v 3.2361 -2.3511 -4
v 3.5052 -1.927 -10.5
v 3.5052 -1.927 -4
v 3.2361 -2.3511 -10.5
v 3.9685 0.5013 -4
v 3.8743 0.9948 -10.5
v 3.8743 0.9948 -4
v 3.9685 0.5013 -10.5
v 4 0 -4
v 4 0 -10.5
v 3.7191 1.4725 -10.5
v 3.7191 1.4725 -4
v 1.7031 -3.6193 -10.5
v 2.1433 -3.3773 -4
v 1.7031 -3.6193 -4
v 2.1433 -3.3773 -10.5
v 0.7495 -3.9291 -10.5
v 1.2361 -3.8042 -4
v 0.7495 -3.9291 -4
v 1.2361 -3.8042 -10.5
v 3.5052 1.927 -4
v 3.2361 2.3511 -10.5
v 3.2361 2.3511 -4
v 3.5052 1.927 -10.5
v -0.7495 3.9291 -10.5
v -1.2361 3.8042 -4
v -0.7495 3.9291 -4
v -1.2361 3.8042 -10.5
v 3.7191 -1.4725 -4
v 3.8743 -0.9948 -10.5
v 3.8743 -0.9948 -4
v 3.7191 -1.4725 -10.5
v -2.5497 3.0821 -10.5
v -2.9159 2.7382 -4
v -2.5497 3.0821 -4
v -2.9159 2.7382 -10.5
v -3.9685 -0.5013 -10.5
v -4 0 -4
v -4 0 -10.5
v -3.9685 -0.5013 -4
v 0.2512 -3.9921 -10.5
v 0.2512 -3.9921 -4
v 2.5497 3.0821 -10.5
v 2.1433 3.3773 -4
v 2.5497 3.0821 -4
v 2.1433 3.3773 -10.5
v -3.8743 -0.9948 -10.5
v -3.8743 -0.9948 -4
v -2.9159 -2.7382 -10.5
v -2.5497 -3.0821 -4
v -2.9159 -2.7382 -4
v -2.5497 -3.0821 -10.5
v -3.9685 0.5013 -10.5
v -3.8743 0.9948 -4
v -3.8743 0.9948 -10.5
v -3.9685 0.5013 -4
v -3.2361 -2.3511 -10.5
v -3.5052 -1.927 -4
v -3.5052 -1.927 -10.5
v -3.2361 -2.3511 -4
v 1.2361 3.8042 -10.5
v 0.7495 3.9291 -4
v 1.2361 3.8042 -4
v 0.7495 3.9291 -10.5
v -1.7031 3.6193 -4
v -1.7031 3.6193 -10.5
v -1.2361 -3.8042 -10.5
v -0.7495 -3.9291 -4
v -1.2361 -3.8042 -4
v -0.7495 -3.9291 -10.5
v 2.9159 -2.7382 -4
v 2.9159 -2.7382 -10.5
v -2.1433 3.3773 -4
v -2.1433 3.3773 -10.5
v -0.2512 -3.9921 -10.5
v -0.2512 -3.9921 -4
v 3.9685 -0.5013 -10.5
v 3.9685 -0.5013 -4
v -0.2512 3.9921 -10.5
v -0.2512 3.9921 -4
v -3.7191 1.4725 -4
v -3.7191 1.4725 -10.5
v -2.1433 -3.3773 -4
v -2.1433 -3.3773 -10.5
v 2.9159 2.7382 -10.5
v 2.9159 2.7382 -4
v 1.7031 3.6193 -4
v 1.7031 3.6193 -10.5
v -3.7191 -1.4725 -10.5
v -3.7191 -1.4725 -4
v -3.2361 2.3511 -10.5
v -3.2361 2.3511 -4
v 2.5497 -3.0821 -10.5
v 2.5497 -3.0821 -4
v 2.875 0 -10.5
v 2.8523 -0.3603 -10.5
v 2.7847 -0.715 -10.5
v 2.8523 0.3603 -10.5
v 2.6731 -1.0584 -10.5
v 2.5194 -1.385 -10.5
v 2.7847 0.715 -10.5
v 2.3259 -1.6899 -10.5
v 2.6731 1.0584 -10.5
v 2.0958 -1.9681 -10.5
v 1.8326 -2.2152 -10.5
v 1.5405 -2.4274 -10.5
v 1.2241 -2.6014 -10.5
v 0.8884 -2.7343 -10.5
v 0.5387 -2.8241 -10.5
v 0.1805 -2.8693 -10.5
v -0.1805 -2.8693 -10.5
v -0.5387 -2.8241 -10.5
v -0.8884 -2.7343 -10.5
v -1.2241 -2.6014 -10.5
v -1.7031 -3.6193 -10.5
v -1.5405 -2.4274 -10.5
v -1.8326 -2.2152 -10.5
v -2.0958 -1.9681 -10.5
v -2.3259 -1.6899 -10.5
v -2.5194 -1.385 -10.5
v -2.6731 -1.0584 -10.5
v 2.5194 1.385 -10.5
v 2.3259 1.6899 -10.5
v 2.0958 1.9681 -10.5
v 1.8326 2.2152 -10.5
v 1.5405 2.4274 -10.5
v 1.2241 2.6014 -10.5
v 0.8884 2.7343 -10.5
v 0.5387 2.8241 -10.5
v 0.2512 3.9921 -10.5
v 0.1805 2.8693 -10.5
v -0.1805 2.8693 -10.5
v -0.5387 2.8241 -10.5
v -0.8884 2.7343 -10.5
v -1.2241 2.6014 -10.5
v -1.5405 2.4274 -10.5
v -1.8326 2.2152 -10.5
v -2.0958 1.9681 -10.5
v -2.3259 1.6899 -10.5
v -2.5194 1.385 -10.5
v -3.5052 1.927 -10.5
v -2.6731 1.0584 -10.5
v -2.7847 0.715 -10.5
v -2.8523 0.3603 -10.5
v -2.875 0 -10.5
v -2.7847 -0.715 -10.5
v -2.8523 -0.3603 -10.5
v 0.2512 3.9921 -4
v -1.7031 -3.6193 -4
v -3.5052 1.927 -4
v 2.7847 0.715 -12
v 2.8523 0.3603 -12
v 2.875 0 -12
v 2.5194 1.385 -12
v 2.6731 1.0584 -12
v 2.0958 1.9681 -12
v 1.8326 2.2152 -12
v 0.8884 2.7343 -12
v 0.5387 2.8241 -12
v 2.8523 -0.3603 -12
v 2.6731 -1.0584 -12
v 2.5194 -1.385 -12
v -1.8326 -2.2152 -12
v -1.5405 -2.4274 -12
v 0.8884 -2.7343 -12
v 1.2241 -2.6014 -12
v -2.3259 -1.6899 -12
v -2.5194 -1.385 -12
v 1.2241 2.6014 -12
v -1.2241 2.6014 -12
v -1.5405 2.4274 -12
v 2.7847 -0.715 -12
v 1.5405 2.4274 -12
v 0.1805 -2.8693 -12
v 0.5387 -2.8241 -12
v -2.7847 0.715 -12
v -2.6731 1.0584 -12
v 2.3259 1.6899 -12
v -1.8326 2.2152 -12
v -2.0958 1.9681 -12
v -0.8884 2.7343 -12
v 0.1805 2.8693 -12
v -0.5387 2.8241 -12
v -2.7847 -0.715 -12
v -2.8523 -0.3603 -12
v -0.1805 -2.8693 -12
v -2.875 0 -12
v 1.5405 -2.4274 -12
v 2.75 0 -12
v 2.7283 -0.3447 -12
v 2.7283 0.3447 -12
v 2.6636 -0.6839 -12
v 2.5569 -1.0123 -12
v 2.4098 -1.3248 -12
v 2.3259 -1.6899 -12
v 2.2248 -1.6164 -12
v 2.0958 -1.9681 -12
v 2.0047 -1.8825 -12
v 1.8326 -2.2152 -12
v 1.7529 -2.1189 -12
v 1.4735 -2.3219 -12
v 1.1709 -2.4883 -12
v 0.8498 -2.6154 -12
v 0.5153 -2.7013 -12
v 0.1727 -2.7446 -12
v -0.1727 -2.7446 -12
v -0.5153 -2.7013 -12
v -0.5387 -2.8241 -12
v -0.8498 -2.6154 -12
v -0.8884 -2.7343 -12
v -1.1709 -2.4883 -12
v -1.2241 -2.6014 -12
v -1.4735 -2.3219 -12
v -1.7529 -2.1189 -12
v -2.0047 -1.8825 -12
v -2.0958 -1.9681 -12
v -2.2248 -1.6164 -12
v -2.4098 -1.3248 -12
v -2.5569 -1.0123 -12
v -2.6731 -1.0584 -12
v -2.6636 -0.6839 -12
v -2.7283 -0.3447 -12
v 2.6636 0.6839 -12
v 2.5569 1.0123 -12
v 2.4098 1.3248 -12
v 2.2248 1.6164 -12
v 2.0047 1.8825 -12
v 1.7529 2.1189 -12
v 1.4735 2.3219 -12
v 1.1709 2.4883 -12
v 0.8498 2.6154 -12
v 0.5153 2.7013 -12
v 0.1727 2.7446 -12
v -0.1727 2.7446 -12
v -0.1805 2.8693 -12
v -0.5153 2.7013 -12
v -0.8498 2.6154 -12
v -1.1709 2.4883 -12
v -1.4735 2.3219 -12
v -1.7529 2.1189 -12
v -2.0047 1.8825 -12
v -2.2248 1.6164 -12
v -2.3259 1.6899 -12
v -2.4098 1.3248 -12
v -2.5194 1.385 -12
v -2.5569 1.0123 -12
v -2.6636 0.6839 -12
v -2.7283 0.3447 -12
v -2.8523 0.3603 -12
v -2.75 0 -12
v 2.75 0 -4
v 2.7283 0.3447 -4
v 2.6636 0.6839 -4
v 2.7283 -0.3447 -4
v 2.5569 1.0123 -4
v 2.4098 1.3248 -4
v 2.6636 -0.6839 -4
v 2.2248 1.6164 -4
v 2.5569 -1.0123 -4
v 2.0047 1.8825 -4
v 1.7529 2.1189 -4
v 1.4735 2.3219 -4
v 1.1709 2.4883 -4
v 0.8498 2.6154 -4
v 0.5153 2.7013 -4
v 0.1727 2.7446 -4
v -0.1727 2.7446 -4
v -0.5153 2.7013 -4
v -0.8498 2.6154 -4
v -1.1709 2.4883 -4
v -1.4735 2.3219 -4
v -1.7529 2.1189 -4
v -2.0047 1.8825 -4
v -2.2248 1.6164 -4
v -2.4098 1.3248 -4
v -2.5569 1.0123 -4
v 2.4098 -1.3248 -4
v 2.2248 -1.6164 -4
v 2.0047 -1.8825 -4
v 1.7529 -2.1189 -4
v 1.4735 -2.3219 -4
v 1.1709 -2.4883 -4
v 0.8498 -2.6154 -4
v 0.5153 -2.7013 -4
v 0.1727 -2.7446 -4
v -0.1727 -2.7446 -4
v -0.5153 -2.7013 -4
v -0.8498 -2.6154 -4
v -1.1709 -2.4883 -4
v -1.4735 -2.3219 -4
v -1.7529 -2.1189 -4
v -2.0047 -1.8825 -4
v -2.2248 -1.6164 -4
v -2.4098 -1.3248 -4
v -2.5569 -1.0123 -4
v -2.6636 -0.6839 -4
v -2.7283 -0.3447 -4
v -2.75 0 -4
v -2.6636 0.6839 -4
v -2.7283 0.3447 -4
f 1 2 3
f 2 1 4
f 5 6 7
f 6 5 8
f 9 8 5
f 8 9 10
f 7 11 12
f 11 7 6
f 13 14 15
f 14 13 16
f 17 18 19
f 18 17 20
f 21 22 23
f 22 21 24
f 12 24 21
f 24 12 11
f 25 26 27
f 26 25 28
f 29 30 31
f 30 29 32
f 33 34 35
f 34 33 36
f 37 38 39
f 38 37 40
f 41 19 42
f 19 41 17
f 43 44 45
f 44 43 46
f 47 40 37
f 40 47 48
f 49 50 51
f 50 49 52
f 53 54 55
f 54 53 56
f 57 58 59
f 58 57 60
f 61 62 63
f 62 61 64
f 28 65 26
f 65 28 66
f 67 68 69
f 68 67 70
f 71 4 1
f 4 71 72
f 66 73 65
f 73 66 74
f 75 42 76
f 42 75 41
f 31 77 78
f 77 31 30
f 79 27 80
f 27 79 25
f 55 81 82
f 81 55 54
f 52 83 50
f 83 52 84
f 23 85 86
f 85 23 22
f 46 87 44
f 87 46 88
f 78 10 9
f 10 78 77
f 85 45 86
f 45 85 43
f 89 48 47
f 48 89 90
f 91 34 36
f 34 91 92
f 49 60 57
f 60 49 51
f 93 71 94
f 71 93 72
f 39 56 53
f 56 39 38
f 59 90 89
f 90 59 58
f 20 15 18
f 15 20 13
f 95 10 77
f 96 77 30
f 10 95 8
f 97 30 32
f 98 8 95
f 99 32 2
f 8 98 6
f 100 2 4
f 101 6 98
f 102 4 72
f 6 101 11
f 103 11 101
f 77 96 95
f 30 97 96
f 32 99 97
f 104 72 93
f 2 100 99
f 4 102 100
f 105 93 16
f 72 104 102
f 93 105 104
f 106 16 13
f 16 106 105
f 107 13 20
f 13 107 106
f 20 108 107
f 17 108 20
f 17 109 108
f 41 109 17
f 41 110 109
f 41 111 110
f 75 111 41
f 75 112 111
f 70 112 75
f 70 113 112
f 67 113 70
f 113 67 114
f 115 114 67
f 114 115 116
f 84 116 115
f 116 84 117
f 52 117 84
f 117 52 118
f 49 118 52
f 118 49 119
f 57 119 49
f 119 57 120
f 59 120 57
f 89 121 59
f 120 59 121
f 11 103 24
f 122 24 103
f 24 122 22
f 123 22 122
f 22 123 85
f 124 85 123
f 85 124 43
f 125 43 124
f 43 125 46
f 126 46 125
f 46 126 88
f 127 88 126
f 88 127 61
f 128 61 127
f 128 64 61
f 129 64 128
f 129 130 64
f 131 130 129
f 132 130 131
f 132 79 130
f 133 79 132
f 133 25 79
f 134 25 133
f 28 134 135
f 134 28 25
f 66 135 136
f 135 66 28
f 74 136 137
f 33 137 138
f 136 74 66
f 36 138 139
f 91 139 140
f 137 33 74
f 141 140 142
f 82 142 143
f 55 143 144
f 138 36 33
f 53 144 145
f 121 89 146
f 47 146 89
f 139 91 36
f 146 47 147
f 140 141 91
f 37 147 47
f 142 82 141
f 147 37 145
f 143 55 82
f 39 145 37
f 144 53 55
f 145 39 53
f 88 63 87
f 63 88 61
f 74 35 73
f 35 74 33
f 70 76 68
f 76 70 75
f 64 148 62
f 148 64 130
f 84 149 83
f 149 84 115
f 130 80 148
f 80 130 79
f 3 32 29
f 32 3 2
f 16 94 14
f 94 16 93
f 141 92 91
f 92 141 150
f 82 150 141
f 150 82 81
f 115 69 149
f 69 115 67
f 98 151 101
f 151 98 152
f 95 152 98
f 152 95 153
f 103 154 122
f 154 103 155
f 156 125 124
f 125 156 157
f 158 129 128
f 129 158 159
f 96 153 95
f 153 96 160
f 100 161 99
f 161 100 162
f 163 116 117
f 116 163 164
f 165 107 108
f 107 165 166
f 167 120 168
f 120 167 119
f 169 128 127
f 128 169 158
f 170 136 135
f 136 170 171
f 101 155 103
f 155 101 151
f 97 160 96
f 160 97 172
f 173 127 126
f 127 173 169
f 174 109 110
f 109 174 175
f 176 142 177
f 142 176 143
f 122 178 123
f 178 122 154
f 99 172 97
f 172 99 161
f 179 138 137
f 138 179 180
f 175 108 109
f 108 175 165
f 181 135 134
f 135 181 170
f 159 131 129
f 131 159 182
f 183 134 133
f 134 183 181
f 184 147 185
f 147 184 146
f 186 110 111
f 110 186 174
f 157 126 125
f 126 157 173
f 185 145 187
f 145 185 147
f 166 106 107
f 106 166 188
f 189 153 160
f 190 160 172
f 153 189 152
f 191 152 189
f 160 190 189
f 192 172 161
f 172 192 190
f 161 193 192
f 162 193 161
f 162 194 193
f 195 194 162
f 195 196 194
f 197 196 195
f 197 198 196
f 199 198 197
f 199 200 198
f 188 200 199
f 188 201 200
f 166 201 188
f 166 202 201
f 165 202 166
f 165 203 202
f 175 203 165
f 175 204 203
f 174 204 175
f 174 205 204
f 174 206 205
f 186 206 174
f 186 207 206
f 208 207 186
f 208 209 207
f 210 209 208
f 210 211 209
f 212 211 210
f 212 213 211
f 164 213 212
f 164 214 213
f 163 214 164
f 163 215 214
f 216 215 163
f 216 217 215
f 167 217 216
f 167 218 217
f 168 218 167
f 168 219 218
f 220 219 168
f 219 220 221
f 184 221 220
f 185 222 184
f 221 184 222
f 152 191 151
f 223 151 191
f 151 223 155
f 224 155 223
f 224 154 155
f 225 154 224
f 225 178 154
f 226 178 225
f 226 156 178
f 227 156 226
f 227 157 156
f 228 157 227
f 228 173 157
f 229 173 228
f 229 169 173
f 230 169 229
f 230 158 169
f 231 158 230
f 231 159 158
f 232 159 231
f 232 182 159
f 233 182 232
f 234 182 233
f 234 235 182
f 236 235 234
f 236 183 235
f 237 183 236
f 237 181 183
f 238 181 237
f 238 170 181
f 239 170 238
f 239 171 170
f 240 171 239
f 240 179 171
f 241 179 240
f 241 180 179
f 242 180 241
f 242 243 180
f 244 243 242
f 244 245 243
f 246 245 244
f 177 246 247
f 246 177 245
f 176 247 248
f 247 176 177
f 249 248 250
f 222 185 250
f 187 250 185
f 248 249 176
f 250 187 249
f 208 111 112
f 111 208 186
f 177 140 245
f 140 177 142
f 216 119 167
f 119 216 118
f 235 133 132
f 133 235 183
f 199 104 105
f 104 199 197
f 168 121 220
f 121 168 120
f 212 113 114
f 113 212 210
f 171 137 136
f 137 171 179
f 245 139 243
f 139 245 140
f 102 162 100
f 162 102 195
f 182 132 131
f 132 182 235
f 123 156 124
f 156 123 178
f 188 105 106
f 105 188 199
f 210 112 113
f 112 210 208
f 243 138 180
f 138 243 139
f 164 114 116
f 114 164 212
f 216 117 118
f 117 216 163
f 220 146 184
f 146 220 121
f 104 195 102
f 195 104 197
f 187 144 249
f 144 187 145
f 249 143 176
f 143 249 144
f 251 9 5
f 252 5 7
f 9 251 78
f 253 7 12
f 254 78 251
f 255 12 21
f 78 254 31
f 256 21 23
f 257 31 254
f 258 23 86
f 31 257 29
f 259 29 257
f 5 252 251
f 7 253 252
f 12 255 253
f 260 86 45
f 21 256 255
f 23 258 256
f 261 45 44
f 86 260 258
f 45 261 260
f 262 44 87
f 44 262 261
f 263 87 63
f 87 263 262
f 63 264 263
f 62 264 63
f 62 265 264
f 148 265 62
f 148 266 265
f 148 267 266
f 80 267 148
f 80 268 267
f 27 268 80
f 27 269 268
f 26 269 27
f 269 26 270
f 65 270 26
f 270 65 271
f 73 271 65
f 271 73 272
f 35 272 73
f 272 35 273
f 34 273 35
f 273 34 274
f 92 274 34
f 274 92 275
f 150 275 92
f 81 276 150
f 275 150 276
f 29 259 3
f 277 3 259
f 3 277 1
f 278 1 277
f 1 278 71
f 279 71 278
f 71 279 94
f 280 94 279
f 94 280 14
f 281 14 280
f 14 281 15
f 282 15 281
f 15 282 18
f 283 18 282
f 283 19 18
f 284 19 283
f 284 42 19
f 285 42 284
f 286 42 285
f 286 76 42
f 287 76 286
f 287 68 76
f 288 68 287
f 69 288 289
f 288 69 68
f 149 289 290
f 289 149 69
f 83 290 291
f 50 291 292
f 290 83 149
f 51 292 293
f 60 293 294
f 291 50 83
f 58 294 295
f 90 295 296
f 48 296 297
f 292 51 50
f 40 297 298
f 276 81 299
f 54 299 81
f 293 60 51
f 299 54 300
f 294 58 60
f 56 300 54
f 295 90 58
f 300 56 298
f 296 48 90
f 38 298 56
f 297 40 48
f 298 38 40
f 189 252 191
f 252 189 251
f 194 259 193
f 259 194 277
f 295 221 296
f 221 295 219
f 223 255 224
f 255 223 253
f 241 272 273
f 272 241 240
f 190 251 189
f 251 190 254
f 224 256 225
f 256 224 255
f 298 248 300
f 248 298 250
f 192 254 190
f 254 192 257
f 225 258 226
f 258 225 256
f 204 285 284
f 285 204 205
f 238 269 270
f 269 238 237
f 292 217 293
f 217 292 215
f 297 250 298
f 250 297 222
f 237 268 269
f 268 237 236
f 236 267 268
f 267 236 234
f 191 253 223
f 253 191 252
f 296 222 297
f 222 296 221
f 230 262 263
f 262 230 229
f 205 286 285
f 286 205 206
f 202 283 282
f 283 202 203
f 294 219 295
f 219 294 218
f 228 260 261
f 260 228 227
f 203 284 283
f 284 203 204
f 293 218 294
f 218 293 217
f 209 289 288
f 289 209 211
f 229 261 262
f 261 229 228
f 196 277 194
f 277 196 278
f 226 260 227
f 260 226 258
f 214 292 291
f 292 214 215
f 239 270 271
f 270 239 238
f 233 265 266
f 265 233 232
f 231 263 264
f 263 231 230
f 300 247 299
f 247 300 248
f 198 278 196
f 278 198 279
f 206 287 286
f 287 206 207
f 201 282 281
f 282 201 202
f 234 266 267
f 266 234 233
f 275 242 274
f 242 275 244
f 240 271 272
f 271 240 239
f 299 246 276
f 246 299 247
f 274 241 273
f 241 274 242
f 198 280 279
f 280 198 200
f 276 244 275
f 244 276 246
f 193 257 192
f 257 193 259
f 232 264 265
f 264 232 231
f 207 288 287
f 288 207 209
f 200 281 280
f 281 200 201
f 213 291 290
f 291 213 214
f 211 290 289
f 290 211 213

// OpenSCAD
$fn = 50;

difference() {
	union() {
		translate(v = [0, 0, -10.5]) {
			cylinder(h = 10.5, r = 4.0);
		}
		#translate(v = [0, 0, -12.0]) {
			cylinder(h = 12, r = 2.875);
		}
	}
	union() {
		translate(v = [0, 0, 0]) {
			rotate(a = [0, 0, 0]) {
				difference() {
					union() {
						translate(v = [0, 0, -4]) {
							linear_extrude(height = 4) {
								polygon(points = [[4.8468, 0.0], [2.4234000000000004, 4.197451927062417], [-2.423399999999999, 4.197451927062417], [-4.8468, 5.935618106107392e-16], [-2.423400000000002, -4.197451927062416], [2.423399999999997, -4.197451927062419]]);
							}
						}
					}
					union();
				}
			}
		}
		#translate(v = [0, 0, -100.0]) {
			cylinder(h = 200, r = 2.75);
		}
	}
}
